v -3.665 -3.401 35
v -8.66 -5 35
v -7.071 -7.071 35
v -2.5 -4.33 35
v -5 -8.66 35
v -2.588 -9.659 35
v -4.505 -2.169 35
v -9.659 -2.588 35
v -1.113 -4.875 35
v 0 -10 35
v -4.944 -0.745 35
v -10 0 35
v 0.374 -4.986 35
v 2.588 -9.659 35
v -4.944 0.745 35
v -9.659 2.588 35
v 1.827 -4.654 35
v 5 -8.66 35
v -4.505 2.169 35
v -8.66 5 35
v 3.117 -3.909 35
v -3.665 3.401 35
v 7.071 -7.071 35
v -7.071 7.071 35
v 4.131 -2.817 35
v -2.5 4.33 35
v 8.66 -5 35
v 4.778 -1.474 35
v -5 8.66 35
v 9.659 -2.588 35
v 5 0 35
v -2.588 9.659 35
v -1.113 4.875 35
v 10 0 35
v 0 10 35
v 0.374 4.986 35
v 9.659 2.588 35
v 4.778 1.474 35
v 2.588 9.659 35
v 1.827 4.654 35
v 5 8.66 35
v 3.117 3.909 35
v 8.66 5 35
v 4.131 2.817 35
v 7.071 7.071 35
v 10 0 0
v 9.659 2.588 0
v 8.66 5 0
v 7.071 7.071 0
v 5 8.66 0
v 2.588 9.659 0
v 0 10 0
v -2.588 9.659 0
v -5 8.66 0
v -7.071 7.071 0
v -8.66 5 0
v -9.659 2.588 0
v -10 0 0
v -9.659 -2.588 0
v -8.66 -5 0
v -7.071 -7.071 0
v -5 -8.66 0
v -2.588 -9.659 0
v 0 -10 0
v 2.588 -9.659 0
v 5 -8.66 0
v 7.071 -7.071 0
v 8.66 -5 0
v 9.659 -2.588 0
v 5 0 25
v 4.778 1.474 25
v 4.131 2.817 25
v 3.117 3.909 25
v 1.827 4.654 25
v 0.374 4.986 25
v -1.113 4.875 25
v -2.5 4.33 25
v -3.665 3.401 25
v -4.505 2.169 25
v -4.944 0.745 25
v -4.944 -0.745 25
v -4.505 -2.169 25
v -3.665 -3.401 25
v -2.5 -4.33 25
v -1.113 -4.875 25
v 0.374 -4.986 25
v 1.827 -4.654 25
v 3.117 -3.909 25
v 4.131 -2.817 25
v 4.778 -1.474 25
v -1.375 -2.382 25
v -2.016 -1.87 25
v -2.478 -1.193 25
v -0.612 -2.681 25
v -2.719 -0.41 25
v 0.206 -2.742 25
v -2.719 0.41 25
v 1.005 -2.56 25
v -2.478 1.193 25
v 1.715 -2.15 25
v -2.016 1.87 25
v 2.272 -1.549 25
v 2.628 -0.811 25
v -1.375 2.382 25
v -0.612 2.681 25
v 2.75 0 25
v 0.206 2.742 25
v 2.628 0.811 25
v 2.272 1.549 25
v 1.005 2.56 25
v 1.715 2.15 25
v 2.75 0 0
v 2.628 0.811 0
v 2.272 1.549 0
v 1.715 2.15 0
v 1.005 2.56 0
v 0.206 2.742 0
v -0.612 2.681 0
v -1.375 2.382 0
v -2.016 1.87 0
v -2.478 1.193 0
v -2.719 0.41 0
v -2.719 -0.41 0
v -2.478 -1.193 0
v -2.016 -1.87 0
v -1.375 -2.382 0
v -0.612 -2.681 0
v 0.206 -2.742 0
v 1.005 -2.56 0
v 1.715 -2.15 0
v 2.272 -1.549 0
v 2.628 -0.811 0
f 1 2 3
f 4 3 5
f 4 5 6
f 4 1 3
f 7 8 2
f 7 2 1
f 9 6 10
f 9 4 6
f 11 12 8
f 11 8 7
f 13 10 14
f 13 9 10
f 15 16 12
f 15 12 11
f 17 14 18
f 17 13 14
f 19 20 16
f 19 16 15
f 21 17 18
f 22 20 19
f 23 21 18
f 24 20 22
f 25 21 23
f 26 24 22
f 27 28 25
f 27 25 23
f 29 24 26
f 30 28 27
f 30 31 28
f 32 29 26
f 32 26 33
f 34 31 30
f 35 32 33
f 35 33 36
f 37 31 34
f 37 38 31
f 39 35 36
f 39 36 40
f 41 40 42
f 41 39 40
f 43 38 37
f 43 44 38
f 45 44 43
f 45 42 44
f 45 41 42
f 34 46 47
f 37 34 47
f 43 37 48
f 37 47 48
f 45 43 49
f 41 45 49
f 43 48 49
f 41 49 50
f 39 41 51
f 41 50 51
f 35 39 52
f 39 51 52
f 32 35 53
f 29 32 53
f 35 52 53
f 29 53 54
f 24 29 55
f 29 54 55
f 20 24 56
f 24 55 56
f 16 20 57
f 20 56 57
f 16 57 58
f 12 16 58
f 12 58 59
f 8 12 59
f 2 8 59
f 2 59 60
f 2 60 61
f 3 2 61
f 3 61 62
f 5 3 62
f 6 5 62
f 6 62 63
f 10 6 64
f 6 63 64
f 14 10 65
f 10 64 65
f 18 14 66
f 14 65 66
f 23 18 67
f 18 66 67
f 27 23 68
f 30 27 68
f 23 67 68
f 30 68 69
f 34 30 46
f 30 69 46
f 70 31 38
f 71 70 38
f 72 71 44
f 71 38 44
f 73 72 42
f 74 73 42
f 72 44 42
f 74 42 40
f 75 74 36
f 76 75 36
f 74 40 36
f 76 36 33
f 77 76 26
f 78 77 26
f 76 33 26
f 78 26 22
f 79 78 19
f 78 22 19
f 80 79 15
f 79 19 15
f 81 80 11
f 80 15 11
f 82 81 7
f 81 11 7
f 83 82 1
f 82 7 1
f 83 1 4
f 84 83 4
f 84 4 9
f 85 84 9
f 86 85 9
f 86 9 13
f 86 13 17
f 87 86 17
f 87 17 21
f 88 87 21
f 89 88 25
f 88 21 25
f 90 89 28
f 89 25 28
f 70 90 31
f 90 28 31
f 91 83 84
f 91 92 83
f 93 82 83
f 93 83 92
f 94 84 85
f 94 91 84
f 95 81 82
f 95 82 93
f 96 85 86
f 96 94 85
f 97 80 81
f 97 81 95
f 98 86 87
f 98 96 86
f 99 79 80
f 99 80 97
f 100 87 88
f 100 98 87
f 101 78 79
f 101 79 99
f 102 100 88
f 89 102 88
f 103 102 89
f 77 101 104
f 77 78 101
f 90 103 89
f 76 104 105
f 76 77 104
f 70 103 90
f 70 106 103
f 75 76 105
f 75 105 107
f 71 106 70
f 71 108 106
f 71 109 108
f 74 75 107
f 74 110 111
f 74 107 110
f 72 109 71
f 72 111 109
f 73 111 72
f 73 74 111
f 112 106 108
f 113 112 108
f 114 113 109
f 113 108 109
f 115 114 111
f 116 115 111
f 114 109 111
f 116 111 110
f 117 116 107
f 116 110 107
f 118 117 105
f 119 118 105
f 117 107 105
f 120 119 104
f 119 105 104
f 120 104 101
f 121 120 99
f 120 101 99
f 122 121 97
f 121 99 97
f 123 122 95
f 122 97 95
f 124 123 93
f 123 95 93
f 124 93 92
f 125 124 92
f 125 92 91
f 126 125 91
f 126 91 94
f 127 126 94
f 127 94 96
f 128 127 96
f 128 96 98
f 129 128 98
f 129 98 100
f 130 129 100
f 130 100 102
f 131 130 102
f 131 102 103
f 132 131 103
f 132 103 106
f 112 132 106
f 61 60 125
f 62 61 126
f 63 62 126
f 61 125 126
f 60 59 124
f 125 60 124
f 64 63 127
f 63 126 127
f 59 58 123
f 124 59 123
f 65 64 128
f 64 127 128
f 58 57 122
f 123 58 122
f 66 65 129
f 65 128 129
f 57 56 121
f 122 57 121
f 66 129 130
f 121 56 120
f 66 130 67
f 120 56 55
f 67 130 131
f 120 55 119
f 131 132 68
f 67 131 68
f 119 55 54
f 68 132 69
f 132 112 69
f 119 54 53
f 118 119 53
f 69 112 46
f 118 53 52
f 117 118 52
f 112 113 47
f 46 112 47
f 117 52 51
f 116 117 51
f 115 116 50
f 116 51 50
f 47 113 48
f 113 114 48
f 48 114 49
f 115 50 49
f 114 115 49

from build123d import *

# Parameters (mm, degrees)
SKETCH_R        = 10
PAD_DEPTH       = 35
SKETCH001_R     = 2.75
POCKET_DEPTH    = 35.001
SKETCH002_R     = 5
POCKET001_DEPTH = 10


with BuildPart() as part:
    # Sketch → Pad (new body)
    with BuildSketch(Plane.XY):
        Circle(SKETCH_R)
    extrude(amount=PAD_DEPTH)

    # Sketch001 (on Face3 of Pad) → Pocket (cut, through all)
    with BuildSketch(Plane.XY.offset(35)):
        Circle(SKETCH001_R)
    extrude(amount=-POCKET_DEPTH, mode=Mode.SUBTRACT)

    # Sketch002 (on Face3 of Pocket) → Pocket001 (cut)
    with BuildSketch(Plane.XY.offset(35)):
        Circle(SKETCH002_R)
    extrude(amount=-POCKET001_DEPTH, mode=Mode.SUBTRACT)


solid = part.part
